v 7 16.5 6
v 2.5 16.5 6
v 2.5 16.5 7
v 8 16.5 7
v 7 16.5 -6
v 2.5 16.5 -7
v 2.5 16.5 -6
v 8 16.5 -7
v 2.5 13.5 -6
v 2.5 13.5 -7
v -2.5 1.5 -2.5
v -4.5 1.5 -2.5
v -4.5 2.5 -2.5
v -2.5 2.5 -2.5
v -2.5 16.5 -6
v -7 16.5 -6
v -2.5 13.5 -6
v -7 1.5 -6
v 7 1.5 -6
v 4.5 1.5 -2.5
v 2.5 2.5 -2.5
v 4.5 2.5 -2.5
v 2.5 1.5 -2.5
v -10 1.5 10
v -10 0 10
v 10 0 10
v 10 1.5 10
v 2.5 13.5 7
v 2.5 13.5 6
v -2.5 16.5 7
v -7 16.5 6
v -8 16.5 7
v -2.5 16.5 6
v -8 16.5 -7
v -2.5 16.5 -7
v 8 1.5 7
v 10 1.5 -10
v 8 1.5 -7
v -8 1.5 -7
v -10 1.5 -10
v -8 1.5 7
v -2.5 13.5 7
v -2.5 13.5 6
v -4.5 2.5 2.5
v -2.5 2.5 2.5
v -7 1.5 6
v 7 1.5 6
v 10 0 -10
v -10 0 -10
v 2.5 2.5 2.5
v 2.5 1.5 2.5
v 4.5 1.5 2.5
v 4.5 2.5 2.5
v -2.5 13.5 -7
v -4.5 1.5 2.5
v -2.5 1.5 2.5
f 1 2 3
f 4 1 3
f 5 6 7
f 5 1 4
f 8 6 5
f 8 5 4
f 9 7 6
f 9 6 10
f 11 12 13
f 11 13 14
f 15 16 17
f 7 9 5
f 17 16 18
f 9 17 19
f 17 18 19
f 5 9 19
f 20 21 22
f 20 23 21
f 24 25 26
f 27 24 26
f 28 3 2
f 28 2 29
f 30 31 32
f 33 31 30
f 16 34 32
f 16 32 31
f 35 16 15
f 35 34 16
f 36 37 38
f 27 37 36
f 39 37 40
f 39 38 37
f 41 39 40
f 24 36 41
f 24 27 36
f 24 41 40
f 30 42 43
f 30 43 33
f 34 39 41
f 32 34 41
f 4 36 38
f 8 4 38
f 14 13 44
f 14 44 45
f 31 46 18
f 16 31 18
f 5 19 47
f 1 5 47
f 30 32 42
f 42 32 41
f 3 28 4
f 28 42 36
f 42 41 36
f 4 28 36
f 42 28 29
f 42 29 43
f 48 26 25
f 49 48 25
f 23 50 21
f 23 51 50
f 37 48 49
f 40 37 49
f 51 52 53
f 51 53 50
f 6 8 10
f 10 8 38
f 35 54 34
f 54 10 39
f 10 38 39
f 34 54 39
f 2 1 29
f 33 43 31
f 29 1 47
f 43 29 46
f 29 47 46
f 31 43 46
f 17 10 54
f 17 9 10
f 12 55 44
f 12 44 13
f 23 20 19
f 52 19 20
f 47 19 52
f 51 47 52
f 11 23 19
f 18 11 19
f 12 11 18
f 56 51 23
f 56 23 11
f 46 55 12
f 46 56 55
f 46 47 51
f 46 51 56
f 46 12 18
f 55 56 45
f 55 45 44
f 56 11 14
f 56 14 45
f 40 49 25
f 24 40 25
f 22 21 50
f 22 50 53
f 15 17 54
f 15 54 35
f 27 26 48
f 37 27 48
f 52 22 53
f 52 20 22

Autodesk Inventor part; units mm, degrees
ref_plane "YZ Plane" through (0, 0, 0) normal (1, 0, 0) x (0, 1, 0)
ref_plane "XZ Plane" through (0, 0, 0) normal (0, 1, 0) x (-1, 0, 0)
ref_plane "XY Plane" through (0, 0, 0) normal (0, 0, 1) x (1, 0, 0)
sketch "草圖8" plane through (0, 0, 0) normal (0, 1, 0) x (-1, 0, 0)
  line L0 (10, 10) -> (-10, 10)
  line L1 (-10, 10) -> (-10, -10)
  line L2 (-10, -10) -> (10, -10)
  line L3 (10, -10) -> (10, 10)
  line L4 (10, 10) -> (-10, -10) construction
  line L5 (-10, 10) -> (10, -10) construction
  point P0 (0, 0)
  dimension "d36" = 20
  dimension "d37" = 20
extrude "擠出8" add sketch "草圖8" along normal blind 1.5
sketch "草圖9" plane through (0, 1.5, 0) normal (0, 1, 0) x (1, 0, 0)
  line L0 (-8, -7) -> (8, -7)
  line L1 (8, -7) -> (8, 7)
  line L2 (8, 7) -> (-8, 7)
  line L3 (-8, 7) -> (-8, -7)
  line L4 (-8, -7) -> (8, 7) construction
  line L5 (8, -7) -> (-8, 7) construction
  line L6 (-7, 6) -> (7, 6)
  line L7 (7, 6) -> (7, -6)
  line L8 (7, -6) -> (-7, -6)
  line L9 (-7, -6) -> (-7, 6)
  line L10 (-7, 6) -> (7, -6) construction
  line L11 (7, 6) -> (-7, -6) construction
  point P0 (0, 0)
  dimension "d40" = 16
  dimension "d41" = 14
  dimension "d46" = 14
  dimension "d47" = 12
extrude "擠出10" add sketch "草圖9" along normal blind 15
sketch "草圖11" plane through (-8, 1.5, 7) normal (0, 0, 1) x (1, 0, 0)
  line L0 (5.5, 18) -> (10.5, 18)
  line L1 (10.5, 18) -> (10.5, 12)
  line L2 (10.5, 12) -> (5.5, 12)
  line L3 (5.5, 12) -> (5.5, 18)
  line L4 (16, 15) -> (0, 15) projected
  line L5 (5.5, 18) -> (10.5, 12) construction
  line L6 (10.5, 18) -> (5.5, 12) construction
  point P0 (8, -1.5)
  point P1 (8, 15)
  point P2 (10.5, 15)
  point P3 (5.5, 15)
  dimension "d50" = 5
  dimension "d51" = 6
extrude "擠出11" cut sketch "草圖11" against normal blind 15 contours L4 L1 L2 L3
sketch "草圖12" plane through (0, 1.5, 0) normal (0, 1, 0) x (1, 0, 0)
  line L0 (-4.5, 2.5) -> (-2.5, 2.5)
  line L1 (-2.5, 2.5) -> (-2.5, -2.5)
  line L2 (-2.5, -2.5) -> (-4.5, -2.5)
  line L3 (-4.5, -2.5) -> (-4.5, 2.5)
  line L4 (-4.5, 2.5) -> (-2.5, -2.5) construction
  line L5 (-2.5, 2.5) -> (-4.5, -2.5) construction
  line L6 (2.5, 2.5) -> (4.5, 2.5)
  line L7 (4.5, 2.5) -> (4.5, -2.5)
  line L8 (4.5, -2.5) -> (2.5, -2.5)
  line L9 (2.5, -2.5) -> (2.5, 2.5)
  line L10 (2.5, 2.5) -> (4.5, -2.5) construction
  line L11 (4.5, 2.5) -> (2.5, -2.5) construction
  line L12 (7, 6) -> (7, -6) projected
  point P0 (0, 0)
  point P1 (-3.5, 0)
  point P2 (3.5, 0)
  point P3 (7, 0)
  dimension "d54" = 5
  dimension "d55" = 2
  dimension "d56" = 5
  dimension "d57" = 2
  dimension "d58" = 3.5
  dimension "d59" = 3.5
  dimension "d60" = 3.5
extrude "擠出12" add sketch "草圖12" along normal blind 1
properties part number "差分線圈激勵"
